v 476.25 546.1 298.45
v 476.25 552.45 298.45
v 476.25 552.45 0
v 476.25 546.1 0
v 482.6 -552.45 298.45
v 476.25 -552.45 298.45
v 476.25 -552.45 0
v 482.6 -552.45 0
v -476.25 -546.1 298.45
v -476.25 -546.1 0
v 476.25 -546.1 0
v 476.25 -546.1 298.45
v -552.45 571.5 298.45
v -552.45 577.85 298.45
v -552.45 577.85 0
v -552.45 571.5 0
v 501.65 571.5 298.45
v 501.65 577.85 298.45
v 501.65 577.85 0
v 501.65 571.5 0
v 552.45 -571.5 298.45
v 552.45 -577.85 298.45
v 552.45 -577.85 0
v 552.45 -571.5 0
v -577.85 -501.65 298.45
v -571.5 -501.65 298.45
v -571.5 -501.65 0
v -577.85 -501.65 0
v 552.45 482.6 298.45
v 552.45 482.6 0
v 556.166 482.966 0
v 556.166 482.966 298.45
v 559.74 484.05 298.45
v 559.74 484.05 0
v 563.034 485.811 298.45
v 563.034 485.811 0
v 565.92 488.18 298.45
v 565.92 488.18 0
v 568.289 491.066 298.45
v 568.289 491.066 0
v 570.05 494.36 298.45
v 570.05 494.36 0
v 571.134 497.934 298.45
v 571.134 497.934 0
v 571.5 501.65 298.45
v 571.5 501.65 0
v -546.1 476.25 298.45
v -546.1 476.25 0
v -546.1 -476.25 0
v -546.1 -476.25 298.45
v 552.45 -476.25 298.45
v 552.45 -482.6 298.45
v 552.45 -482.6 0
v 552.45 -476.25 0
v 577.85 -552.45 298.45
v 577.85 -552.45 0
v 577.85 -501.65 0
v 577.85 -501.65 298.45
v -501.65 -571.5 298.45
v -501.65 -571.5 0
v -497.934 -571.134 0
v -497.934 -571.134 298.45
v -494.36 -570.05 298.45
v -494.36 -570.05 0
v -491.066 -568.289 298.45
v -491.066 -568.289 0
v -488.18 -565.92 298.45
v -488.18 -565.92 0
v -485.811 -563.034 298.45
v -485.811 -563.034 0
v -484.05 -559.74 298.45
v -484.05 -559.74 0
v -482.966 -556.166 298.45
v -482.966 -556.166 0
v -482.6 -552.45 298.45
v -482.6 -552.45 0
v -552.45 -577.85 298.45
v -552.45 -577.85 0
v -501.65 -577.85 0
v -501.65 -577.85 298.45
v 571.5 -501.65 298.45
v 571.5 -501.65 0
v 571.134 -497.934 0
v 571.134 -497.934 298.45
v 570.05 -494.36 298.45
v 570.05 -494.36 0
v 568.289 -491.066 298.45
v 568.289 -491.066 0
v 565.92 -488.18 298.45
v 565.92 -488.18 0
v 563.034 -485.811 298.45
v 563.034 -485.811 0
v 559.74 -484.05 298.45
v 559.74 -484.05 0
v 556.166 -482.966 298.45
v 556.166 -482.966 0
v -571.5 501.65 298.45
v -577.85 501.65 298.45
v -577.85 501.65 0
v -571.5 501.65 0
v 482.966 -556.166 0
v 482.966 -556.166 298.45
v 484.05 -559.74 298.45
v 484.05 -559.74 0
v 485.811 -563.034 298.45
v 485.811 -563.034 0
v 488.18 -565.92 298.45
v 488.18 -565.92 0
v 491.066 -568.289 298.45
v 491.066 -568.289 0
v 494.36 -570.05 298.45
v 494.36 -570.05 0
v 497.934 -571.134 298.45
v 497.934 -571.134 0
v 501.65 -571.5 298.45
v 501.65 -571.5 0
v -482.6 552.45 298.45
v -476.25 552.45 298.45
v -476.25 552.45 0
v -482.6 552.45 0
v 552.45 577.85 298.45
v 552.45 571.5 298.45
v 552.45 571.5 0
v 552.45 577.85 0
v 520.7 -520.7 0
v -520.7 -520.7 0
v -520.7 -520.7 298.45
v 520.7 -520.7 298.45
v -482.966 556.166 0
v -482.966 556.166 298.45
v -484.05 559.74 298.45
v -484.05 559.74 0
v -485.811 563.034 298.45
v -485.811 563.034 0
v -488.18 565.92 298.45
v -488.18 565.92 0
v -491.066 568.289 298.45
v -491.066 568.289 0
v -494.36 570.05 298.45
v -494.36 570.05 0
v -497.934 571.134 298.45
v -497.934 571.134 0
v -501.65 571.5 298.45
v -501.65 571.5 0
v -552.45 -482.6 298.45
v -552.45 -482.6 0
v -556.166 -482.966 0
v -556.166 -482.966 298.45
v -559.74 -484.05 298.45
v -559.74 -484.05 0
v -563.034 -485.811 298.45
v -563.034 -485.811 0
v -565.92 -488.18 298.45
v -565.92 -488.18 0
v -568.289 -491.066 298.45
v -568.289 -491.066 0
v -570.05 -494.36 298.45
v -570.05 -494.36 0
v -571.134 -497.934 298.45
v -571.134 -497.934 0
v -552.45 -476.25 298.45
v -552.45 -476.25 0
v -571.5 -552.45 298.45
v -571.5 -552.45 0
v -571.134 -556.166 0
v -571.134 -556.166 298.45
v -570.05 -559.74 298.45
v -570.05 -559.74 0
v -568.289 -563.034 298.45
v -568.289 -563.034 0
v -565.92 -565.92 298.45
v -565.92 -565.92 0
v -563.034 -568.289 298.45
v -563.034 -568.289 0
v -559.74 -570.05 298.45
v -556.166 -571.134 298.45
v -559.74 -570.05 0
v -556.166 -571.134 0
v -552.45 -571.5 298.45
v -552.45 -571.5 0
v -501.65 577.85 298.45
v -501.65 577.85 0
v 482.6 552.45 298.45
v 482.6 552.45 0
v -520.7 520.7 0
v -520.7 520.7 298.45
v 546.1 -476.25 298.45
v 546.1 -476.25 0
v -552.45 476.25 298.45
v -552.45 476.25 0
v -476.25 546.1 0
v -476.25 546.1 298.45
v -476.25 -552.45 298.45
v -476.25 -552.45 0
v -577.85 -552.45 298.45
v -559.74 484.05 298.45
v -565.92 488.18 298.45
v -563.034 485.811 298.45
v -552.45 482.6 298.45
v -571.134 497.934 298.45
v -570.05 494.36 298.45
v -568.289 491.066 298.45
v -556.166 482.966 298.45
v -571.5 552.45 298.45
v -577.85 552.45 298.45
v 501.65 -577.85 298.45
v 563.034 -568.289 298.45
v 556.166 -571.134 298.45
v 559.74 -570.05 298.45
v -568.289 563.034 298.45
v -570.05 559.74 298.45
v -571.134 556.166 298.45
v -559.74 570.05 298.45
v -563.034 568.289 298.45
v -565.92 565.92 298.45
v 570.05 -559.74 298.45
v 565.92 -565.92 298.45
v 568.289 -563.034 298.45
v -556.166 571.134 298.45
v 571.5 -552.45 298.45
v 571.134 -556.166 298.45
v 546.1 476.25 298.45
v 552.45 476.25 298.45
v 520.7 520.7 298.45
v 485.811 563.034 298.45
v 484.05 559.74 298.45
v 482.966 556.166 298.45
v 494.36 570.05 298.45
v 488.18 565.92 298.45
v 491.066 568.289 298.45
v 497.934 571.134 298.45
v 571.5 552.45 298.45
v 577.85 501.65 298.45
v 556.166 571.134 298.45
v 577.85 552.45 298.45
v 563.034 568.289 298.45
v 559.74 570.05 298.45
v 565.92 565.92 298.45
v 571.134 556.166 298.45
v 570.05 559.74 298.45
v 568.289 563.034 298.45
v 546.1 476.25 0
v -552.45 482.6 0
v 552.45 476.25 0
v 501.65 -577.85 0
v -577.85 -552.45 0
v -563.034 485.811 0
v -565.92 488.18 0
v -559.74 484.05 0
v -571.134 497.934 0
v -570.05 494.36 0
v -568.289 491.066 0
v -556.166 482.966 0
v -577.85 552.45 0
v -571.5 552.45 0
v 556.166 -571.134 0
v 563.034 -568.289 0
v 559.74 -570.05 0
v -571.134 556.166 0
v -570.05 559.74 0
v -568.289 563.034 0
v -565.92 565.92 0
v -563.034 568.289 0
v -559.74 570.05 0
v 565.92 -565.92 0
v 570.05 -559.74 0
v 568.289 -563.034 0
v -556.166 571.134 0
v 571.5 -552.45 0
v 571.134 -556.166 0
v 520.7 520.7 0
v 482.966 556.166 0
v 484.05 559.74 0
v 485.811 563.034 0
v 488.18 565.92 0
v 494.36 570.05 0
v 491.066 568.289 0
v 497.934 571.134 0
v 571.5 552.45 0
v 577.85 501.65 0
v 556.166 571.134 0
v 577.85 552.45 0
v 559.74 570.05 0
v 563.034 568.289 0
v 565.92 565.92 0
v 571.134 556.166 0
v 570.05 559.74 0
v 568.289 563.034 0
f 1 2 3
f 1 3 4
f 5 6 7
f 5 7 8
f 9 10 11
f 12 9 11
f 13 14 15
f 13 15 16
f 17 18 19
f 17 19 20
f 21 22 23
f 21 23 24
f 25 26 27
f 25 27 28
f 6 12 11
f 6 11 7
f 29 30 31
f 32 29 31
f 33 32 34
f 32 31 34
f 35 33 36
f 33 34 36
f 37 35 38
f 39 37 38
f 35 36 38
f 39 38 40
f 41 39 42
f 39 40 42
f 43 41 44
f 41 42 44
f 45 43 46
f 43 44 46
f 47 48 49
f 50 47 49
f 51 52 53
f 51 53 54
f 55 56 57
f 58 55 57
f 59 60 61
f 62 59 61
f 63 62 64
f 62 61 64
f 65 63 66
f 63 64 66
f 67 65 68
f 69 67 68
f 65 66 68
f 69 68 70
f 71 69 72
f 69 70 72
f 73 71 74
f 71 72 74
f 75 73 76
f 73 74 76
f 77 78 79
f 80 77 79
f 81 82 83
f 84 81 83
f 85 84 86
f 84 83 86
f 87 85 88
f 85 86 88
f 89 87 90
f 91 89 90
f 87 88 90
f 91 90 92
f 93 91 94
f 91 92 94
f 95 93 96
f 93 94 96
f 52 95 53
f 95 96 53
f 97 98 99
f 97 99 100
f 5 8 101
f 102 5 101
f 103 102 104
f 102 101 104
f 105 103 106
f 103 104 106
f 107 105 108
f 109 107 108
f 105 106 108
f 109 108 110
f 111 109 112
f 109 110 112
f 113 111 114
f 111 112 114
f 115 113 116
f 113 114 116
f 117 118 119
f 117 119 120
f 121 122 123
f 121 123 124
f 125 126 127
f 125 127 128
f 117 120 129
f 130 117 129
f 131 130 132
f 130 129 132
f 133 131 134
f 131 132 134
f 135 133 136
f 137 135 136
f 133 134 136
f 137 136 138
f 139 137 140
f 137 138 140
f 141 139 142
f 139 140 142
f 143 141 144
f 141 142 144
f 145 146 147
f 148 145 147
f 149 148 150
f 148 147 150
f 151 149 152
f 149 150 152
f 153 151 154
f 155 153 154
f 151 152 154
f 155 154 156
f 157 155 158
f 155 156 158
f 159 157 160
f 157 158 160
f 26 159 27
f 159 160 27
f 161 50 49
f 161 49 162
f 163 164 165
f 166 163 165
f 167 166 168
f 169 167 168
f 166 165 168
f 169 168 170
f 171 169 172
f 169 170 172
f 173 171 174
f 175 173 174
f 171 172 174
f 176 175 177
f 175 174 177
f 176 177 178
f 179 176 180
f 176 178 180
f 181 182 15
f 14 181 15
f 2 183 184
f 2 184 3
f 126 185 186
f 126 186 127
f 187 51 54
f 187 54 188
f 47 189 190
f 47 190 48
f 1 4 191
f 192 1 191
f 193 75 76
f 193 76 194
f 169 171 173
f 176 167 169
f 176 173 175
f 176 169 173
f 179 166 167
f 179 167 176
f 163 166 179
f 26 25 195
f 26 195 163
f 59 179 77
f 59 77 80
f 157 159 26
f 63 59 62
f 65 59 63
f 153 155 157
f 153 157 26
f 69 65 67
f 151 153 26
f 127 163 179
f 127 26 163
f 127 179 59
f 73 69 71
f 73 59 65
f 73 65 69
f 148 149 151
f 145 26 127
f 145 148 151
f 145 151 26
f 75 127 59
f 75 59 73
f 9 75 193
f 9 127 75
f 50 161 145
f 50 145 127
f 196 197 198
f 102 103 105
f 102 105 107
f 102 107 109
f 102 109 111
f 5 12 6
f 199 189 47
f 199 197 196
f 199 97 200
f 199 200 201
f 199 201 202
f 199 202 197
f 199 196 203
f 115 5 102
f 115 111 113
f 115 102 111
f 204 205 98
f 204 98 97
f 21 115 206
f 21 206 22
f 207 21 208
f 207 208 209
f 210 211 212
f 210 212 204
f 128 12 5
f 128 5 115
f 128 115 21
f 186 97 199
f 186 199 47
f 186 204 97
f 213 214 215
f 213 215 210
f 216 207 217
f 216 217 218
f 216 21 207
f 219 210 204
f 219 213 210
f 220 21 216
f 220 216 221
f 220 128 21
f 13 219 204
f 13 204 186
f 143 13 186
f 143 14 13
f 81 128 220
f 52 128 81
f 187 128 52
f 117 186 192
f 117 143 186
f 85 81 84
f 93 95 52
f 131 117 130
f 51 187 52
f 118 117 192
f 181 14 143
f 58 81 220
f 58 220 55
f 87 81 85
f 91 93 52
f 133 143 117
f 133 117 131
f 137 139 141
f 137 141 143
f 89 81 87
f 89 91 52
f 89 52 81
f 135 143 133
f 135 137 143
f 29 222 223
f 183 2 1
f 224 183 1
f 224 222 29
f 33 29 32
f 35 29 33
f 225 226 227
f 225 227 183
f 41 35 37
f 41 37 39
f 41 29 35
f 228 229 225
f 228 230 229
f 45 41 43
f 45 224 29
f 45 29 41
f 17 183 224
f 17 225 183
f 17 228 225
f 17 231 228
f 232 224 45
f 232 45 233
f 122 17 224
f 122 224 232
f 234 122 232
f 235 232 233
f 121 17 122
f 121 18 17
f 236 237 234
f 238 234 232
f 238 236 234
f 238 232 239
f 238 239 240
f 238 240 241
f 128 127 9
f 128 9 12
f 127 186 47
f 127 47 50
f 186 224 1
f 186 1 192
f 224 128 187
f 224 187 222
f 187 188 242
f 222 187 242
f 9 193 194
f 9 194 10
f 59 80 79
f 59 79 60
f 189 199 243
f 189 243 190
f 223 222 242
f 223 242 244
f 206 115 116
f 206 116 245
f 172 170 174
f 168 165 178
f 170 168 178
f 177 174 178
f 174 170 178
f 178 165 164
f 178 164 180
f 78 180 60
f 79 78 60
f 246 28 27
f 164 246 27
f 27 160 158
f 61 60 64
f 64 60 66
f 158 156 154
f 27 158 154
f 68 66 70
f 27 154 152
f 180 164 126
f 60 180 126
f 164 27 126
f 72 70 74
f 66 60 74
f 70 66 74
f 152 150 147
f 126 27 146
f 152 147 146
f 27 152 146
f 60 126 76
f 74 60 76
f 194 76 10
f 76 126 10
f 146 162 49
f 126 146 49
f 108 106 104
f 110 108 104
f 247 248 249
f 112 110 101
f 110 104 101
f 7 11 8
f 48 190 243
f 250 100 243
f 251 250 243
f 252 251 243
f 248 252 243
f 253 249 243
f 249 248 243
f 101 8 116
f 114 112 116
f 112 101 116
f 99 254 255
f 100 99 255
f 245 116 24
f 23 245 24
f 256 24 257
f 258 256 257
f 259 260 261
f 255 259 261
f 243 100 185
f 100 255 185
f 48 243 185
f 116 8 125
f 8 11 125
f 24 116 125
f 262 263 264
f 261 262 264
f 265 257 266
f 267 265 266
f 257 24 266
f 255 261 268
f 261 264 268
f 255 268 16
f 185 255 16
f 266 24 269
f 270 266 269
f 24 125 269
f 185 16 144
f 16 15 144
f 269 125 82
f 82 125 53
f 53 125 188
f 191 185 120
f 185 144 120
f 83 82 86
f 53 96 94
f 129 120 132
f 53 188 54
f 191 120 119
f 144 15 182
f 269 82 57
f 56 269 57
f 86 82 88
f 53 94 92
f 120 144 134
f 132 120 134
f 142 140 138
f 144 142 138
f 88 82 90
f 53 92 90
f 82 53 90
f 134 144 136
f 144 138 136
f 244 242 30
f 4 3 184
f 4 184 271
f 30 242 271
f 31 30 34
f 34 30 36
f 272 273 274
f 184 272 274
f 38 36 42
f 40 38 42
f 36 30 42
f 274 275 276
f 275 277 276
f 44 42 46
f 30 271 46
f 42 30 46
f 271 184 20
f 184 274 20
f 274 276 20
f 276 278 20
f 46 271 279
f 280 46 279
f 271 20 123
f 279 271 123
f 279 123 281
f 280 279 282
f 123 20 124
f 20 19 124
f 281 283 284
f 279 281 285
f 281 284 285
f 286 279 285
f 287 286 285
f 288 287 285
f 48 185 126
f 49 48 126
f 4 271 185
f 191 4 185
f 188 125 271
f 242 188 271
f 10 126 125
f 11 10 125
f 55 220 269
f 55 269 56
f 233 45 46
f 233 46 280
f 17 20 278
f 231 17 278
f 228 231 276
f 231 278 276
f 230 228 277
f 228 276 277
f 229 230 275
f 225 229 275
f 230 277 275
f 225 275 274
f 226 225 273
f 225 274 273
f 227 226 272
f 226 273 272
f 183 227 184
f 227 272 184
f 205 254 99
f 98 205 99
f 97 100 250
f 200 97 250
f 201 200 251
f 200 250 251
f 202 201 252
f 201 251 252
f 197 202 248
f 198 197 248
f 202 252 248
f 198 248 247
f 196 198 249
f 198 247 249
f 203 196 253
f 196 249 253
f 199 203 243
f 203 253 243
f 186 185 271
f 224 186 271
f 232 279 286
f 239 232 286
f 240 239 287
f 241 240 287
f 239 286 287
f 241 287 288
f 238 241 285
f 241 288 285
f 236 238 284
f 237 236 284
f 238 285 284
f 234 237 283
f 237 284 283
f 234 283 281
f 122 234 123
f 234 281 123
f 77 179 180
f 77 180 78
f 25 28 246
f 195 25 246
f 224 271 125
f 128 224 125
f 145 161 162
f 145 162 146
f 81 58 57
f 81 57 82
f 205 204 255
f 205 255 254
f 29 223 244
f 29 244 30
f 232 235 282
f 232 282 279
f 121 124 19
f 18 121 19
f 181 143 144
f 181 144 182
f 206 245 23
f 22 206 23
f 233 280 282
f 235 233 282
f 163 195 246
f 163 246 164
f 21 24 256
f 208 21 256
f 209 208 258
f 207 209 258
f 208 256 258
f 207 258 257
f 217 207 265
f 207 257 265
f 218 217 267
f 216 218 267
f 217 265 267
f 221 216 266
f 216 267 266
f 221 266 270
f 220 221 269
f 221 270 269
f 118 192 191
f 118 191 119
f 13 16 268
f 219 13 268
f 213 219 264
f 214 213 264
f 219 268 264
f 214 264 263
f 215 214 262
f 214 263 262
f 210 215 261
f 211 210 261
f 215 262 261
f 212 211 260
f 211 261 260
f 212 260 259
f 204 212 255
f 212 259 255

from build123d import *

# Parameters (mm, degrees)
F1_DEPTH = 298.45
F2_W     = 1041.4
F2_H     = 1041.4
F3_DEPTH = 298.451


with BuildPart() as f1:
    # F0 (on Top) → F1 (new body)
    with BuildSketch(Plane.XY):
        with BuildLine():
            Line((-552.45, 476.25), (-546.1, 476.25))
            Line((-546.1, 476.25), (-546.1, -476.25))
            Line((-546.1, -476.25), (-552.45, -476.25))
            Line((-552.45, -476.25), (-552.45, -482.6))
            ThreePointArc((-552.45, -482.6), (-565.920384, -488.179616), (-571.5, -501.65))
            Line((-571.5, -501.65), (-577.85, -501.65))
            Line((-577.85, -501.65), (-577.85, -552.45))
            Line((-577.85, -552.45), (-571.5, -552.45))
            ThreePointArc((-571.5, -552.45), (-565.920384, -565.920384), (-552.45, -571.5))
            Line((-552.45, -571.5), (-552.45, -577.85))
            Line((-552.45, -577.85), (-501.65, -577.85))
            Line((-501.65, -577.85), (-501.65, -571.5))
            ThreePointArc((-501.65, -571.5), (-488.179616, -565.920384), (-482.6, -552.45))
            Line((-482.6, -552.45), (-476.25, -552.45))
            Line((-476.25, -552.45), (-476.25, -546.1))
            Line((-476.25, -546.1), (476.25, -546.1))
            Line((476.25, -546.1), (476.25, -552.45))
            Line((476.25, -552.45), (482.6, -552.45))
            ThreePointArc((482.6, -552.45), (488.179616, -565.920384), (501.65, -571.5))
            Line((501.65, -571.5), (501.65, -577.85))
            Line((501.65, -577.85), (552.45, -577.85))
            Line((552.45, -577.85), (552.45, -571.5))
            ThreePointArc((552.45, -571.5), (565.920384, -565.920384), (571.5, -552.45))
            Line((571.5, -552.45), (577.85, -552.45))
            Line((577.85, -552.45), (577.85, -501.65))
            Line((577.85, -501.65), (571.5, -501.65))
            ThreePointArc((571.5, -501.65), (565.920384, -488.179616), (552.45, -482.6))
            Line((552.45, -482.6), (552.45, -476.25))
            Line((552.45, -476.25), (546.1, -476.25))
            Line((546.1, -476.25), (546.1, 476.25))
            Line((546.1, 476.25), (552.45, 476.25))
            Line((552.45, 476.25), (552.45, 482.6))
            ThreePointArc((552.45, 482.6), (565.920384, 488.179616), (571.5, 501.65))
            Line((571.5, 501.65), (577.85, 501.65))
            Line((577.85, 501.65), (577.85, 552.45))
            Line((577.85, 552.45), (571.5, 552.45))
            ThreePointArc((571.5, 552.45), (565.920384, 565.920384), (552.45, 571.5))
            Line((552.45, 571.5), (552.45, 577.85))
            Line((552.45, 577.85), (501.65, 577.85))
            Line((501.65, 577.85), (501.65, 571.5))
            ThreePointArc((501.65, 571.5), (488.179616, 565.920384), (482.6, 552.45))
            Line((482.6, 552.45), (476.25, 552.45))
            Line((476.25, 552.45), (476.25, 546.1))
            Line((476.25, 546.1), (-476.25, 546.1))
            Line((-476.25, 546.1), (-476.25, 552.45))
            Line((-476.25, 552.45), (-482.6, 552.45))
            ThreePointArc((-482.6, 552.45), (-488.179616, 565.920384), (-501.65, 571.5))
            Line((-501.65, 571.5), (-501.65, 577.85))
            Line((-501.65, 577.85), (-552.45, 577.85))
            Line((-552.45, 577.85), (-552.45, 571.5))
            ThreePointArc((-552.45, 571.5), (-565.920384, 565.920384), (-571.5, 552.45))
            Line((-571.5, 552.45), (-577.85, 552.45))
            Line((-577.85, 552.45), (-577.85, 501.65))
            Line((-577.85, 501.65), (-571.5, 501.65))
            ThreePointArc((-571.5, 501.65), (-565.920384, 488.179616), (-552.45, 482.6))
            Line((-552.45, 482.6), (-552.45, 476.25))
        make_face()
    extrude(amount=F1_DEPTH)

    # F2 (on face) → F3 (cut, through all)
    with BuildSketch(Plane(origin=(0, 0, 0), x_dir=(1, 0, 0), z_dir=(0, 0, -1))):
        Rectangle(F2_W, F2_H)
    extrude(amount=-F3_DEPTH, mode=Mode.SUBTRACT)


solid = f1.part
